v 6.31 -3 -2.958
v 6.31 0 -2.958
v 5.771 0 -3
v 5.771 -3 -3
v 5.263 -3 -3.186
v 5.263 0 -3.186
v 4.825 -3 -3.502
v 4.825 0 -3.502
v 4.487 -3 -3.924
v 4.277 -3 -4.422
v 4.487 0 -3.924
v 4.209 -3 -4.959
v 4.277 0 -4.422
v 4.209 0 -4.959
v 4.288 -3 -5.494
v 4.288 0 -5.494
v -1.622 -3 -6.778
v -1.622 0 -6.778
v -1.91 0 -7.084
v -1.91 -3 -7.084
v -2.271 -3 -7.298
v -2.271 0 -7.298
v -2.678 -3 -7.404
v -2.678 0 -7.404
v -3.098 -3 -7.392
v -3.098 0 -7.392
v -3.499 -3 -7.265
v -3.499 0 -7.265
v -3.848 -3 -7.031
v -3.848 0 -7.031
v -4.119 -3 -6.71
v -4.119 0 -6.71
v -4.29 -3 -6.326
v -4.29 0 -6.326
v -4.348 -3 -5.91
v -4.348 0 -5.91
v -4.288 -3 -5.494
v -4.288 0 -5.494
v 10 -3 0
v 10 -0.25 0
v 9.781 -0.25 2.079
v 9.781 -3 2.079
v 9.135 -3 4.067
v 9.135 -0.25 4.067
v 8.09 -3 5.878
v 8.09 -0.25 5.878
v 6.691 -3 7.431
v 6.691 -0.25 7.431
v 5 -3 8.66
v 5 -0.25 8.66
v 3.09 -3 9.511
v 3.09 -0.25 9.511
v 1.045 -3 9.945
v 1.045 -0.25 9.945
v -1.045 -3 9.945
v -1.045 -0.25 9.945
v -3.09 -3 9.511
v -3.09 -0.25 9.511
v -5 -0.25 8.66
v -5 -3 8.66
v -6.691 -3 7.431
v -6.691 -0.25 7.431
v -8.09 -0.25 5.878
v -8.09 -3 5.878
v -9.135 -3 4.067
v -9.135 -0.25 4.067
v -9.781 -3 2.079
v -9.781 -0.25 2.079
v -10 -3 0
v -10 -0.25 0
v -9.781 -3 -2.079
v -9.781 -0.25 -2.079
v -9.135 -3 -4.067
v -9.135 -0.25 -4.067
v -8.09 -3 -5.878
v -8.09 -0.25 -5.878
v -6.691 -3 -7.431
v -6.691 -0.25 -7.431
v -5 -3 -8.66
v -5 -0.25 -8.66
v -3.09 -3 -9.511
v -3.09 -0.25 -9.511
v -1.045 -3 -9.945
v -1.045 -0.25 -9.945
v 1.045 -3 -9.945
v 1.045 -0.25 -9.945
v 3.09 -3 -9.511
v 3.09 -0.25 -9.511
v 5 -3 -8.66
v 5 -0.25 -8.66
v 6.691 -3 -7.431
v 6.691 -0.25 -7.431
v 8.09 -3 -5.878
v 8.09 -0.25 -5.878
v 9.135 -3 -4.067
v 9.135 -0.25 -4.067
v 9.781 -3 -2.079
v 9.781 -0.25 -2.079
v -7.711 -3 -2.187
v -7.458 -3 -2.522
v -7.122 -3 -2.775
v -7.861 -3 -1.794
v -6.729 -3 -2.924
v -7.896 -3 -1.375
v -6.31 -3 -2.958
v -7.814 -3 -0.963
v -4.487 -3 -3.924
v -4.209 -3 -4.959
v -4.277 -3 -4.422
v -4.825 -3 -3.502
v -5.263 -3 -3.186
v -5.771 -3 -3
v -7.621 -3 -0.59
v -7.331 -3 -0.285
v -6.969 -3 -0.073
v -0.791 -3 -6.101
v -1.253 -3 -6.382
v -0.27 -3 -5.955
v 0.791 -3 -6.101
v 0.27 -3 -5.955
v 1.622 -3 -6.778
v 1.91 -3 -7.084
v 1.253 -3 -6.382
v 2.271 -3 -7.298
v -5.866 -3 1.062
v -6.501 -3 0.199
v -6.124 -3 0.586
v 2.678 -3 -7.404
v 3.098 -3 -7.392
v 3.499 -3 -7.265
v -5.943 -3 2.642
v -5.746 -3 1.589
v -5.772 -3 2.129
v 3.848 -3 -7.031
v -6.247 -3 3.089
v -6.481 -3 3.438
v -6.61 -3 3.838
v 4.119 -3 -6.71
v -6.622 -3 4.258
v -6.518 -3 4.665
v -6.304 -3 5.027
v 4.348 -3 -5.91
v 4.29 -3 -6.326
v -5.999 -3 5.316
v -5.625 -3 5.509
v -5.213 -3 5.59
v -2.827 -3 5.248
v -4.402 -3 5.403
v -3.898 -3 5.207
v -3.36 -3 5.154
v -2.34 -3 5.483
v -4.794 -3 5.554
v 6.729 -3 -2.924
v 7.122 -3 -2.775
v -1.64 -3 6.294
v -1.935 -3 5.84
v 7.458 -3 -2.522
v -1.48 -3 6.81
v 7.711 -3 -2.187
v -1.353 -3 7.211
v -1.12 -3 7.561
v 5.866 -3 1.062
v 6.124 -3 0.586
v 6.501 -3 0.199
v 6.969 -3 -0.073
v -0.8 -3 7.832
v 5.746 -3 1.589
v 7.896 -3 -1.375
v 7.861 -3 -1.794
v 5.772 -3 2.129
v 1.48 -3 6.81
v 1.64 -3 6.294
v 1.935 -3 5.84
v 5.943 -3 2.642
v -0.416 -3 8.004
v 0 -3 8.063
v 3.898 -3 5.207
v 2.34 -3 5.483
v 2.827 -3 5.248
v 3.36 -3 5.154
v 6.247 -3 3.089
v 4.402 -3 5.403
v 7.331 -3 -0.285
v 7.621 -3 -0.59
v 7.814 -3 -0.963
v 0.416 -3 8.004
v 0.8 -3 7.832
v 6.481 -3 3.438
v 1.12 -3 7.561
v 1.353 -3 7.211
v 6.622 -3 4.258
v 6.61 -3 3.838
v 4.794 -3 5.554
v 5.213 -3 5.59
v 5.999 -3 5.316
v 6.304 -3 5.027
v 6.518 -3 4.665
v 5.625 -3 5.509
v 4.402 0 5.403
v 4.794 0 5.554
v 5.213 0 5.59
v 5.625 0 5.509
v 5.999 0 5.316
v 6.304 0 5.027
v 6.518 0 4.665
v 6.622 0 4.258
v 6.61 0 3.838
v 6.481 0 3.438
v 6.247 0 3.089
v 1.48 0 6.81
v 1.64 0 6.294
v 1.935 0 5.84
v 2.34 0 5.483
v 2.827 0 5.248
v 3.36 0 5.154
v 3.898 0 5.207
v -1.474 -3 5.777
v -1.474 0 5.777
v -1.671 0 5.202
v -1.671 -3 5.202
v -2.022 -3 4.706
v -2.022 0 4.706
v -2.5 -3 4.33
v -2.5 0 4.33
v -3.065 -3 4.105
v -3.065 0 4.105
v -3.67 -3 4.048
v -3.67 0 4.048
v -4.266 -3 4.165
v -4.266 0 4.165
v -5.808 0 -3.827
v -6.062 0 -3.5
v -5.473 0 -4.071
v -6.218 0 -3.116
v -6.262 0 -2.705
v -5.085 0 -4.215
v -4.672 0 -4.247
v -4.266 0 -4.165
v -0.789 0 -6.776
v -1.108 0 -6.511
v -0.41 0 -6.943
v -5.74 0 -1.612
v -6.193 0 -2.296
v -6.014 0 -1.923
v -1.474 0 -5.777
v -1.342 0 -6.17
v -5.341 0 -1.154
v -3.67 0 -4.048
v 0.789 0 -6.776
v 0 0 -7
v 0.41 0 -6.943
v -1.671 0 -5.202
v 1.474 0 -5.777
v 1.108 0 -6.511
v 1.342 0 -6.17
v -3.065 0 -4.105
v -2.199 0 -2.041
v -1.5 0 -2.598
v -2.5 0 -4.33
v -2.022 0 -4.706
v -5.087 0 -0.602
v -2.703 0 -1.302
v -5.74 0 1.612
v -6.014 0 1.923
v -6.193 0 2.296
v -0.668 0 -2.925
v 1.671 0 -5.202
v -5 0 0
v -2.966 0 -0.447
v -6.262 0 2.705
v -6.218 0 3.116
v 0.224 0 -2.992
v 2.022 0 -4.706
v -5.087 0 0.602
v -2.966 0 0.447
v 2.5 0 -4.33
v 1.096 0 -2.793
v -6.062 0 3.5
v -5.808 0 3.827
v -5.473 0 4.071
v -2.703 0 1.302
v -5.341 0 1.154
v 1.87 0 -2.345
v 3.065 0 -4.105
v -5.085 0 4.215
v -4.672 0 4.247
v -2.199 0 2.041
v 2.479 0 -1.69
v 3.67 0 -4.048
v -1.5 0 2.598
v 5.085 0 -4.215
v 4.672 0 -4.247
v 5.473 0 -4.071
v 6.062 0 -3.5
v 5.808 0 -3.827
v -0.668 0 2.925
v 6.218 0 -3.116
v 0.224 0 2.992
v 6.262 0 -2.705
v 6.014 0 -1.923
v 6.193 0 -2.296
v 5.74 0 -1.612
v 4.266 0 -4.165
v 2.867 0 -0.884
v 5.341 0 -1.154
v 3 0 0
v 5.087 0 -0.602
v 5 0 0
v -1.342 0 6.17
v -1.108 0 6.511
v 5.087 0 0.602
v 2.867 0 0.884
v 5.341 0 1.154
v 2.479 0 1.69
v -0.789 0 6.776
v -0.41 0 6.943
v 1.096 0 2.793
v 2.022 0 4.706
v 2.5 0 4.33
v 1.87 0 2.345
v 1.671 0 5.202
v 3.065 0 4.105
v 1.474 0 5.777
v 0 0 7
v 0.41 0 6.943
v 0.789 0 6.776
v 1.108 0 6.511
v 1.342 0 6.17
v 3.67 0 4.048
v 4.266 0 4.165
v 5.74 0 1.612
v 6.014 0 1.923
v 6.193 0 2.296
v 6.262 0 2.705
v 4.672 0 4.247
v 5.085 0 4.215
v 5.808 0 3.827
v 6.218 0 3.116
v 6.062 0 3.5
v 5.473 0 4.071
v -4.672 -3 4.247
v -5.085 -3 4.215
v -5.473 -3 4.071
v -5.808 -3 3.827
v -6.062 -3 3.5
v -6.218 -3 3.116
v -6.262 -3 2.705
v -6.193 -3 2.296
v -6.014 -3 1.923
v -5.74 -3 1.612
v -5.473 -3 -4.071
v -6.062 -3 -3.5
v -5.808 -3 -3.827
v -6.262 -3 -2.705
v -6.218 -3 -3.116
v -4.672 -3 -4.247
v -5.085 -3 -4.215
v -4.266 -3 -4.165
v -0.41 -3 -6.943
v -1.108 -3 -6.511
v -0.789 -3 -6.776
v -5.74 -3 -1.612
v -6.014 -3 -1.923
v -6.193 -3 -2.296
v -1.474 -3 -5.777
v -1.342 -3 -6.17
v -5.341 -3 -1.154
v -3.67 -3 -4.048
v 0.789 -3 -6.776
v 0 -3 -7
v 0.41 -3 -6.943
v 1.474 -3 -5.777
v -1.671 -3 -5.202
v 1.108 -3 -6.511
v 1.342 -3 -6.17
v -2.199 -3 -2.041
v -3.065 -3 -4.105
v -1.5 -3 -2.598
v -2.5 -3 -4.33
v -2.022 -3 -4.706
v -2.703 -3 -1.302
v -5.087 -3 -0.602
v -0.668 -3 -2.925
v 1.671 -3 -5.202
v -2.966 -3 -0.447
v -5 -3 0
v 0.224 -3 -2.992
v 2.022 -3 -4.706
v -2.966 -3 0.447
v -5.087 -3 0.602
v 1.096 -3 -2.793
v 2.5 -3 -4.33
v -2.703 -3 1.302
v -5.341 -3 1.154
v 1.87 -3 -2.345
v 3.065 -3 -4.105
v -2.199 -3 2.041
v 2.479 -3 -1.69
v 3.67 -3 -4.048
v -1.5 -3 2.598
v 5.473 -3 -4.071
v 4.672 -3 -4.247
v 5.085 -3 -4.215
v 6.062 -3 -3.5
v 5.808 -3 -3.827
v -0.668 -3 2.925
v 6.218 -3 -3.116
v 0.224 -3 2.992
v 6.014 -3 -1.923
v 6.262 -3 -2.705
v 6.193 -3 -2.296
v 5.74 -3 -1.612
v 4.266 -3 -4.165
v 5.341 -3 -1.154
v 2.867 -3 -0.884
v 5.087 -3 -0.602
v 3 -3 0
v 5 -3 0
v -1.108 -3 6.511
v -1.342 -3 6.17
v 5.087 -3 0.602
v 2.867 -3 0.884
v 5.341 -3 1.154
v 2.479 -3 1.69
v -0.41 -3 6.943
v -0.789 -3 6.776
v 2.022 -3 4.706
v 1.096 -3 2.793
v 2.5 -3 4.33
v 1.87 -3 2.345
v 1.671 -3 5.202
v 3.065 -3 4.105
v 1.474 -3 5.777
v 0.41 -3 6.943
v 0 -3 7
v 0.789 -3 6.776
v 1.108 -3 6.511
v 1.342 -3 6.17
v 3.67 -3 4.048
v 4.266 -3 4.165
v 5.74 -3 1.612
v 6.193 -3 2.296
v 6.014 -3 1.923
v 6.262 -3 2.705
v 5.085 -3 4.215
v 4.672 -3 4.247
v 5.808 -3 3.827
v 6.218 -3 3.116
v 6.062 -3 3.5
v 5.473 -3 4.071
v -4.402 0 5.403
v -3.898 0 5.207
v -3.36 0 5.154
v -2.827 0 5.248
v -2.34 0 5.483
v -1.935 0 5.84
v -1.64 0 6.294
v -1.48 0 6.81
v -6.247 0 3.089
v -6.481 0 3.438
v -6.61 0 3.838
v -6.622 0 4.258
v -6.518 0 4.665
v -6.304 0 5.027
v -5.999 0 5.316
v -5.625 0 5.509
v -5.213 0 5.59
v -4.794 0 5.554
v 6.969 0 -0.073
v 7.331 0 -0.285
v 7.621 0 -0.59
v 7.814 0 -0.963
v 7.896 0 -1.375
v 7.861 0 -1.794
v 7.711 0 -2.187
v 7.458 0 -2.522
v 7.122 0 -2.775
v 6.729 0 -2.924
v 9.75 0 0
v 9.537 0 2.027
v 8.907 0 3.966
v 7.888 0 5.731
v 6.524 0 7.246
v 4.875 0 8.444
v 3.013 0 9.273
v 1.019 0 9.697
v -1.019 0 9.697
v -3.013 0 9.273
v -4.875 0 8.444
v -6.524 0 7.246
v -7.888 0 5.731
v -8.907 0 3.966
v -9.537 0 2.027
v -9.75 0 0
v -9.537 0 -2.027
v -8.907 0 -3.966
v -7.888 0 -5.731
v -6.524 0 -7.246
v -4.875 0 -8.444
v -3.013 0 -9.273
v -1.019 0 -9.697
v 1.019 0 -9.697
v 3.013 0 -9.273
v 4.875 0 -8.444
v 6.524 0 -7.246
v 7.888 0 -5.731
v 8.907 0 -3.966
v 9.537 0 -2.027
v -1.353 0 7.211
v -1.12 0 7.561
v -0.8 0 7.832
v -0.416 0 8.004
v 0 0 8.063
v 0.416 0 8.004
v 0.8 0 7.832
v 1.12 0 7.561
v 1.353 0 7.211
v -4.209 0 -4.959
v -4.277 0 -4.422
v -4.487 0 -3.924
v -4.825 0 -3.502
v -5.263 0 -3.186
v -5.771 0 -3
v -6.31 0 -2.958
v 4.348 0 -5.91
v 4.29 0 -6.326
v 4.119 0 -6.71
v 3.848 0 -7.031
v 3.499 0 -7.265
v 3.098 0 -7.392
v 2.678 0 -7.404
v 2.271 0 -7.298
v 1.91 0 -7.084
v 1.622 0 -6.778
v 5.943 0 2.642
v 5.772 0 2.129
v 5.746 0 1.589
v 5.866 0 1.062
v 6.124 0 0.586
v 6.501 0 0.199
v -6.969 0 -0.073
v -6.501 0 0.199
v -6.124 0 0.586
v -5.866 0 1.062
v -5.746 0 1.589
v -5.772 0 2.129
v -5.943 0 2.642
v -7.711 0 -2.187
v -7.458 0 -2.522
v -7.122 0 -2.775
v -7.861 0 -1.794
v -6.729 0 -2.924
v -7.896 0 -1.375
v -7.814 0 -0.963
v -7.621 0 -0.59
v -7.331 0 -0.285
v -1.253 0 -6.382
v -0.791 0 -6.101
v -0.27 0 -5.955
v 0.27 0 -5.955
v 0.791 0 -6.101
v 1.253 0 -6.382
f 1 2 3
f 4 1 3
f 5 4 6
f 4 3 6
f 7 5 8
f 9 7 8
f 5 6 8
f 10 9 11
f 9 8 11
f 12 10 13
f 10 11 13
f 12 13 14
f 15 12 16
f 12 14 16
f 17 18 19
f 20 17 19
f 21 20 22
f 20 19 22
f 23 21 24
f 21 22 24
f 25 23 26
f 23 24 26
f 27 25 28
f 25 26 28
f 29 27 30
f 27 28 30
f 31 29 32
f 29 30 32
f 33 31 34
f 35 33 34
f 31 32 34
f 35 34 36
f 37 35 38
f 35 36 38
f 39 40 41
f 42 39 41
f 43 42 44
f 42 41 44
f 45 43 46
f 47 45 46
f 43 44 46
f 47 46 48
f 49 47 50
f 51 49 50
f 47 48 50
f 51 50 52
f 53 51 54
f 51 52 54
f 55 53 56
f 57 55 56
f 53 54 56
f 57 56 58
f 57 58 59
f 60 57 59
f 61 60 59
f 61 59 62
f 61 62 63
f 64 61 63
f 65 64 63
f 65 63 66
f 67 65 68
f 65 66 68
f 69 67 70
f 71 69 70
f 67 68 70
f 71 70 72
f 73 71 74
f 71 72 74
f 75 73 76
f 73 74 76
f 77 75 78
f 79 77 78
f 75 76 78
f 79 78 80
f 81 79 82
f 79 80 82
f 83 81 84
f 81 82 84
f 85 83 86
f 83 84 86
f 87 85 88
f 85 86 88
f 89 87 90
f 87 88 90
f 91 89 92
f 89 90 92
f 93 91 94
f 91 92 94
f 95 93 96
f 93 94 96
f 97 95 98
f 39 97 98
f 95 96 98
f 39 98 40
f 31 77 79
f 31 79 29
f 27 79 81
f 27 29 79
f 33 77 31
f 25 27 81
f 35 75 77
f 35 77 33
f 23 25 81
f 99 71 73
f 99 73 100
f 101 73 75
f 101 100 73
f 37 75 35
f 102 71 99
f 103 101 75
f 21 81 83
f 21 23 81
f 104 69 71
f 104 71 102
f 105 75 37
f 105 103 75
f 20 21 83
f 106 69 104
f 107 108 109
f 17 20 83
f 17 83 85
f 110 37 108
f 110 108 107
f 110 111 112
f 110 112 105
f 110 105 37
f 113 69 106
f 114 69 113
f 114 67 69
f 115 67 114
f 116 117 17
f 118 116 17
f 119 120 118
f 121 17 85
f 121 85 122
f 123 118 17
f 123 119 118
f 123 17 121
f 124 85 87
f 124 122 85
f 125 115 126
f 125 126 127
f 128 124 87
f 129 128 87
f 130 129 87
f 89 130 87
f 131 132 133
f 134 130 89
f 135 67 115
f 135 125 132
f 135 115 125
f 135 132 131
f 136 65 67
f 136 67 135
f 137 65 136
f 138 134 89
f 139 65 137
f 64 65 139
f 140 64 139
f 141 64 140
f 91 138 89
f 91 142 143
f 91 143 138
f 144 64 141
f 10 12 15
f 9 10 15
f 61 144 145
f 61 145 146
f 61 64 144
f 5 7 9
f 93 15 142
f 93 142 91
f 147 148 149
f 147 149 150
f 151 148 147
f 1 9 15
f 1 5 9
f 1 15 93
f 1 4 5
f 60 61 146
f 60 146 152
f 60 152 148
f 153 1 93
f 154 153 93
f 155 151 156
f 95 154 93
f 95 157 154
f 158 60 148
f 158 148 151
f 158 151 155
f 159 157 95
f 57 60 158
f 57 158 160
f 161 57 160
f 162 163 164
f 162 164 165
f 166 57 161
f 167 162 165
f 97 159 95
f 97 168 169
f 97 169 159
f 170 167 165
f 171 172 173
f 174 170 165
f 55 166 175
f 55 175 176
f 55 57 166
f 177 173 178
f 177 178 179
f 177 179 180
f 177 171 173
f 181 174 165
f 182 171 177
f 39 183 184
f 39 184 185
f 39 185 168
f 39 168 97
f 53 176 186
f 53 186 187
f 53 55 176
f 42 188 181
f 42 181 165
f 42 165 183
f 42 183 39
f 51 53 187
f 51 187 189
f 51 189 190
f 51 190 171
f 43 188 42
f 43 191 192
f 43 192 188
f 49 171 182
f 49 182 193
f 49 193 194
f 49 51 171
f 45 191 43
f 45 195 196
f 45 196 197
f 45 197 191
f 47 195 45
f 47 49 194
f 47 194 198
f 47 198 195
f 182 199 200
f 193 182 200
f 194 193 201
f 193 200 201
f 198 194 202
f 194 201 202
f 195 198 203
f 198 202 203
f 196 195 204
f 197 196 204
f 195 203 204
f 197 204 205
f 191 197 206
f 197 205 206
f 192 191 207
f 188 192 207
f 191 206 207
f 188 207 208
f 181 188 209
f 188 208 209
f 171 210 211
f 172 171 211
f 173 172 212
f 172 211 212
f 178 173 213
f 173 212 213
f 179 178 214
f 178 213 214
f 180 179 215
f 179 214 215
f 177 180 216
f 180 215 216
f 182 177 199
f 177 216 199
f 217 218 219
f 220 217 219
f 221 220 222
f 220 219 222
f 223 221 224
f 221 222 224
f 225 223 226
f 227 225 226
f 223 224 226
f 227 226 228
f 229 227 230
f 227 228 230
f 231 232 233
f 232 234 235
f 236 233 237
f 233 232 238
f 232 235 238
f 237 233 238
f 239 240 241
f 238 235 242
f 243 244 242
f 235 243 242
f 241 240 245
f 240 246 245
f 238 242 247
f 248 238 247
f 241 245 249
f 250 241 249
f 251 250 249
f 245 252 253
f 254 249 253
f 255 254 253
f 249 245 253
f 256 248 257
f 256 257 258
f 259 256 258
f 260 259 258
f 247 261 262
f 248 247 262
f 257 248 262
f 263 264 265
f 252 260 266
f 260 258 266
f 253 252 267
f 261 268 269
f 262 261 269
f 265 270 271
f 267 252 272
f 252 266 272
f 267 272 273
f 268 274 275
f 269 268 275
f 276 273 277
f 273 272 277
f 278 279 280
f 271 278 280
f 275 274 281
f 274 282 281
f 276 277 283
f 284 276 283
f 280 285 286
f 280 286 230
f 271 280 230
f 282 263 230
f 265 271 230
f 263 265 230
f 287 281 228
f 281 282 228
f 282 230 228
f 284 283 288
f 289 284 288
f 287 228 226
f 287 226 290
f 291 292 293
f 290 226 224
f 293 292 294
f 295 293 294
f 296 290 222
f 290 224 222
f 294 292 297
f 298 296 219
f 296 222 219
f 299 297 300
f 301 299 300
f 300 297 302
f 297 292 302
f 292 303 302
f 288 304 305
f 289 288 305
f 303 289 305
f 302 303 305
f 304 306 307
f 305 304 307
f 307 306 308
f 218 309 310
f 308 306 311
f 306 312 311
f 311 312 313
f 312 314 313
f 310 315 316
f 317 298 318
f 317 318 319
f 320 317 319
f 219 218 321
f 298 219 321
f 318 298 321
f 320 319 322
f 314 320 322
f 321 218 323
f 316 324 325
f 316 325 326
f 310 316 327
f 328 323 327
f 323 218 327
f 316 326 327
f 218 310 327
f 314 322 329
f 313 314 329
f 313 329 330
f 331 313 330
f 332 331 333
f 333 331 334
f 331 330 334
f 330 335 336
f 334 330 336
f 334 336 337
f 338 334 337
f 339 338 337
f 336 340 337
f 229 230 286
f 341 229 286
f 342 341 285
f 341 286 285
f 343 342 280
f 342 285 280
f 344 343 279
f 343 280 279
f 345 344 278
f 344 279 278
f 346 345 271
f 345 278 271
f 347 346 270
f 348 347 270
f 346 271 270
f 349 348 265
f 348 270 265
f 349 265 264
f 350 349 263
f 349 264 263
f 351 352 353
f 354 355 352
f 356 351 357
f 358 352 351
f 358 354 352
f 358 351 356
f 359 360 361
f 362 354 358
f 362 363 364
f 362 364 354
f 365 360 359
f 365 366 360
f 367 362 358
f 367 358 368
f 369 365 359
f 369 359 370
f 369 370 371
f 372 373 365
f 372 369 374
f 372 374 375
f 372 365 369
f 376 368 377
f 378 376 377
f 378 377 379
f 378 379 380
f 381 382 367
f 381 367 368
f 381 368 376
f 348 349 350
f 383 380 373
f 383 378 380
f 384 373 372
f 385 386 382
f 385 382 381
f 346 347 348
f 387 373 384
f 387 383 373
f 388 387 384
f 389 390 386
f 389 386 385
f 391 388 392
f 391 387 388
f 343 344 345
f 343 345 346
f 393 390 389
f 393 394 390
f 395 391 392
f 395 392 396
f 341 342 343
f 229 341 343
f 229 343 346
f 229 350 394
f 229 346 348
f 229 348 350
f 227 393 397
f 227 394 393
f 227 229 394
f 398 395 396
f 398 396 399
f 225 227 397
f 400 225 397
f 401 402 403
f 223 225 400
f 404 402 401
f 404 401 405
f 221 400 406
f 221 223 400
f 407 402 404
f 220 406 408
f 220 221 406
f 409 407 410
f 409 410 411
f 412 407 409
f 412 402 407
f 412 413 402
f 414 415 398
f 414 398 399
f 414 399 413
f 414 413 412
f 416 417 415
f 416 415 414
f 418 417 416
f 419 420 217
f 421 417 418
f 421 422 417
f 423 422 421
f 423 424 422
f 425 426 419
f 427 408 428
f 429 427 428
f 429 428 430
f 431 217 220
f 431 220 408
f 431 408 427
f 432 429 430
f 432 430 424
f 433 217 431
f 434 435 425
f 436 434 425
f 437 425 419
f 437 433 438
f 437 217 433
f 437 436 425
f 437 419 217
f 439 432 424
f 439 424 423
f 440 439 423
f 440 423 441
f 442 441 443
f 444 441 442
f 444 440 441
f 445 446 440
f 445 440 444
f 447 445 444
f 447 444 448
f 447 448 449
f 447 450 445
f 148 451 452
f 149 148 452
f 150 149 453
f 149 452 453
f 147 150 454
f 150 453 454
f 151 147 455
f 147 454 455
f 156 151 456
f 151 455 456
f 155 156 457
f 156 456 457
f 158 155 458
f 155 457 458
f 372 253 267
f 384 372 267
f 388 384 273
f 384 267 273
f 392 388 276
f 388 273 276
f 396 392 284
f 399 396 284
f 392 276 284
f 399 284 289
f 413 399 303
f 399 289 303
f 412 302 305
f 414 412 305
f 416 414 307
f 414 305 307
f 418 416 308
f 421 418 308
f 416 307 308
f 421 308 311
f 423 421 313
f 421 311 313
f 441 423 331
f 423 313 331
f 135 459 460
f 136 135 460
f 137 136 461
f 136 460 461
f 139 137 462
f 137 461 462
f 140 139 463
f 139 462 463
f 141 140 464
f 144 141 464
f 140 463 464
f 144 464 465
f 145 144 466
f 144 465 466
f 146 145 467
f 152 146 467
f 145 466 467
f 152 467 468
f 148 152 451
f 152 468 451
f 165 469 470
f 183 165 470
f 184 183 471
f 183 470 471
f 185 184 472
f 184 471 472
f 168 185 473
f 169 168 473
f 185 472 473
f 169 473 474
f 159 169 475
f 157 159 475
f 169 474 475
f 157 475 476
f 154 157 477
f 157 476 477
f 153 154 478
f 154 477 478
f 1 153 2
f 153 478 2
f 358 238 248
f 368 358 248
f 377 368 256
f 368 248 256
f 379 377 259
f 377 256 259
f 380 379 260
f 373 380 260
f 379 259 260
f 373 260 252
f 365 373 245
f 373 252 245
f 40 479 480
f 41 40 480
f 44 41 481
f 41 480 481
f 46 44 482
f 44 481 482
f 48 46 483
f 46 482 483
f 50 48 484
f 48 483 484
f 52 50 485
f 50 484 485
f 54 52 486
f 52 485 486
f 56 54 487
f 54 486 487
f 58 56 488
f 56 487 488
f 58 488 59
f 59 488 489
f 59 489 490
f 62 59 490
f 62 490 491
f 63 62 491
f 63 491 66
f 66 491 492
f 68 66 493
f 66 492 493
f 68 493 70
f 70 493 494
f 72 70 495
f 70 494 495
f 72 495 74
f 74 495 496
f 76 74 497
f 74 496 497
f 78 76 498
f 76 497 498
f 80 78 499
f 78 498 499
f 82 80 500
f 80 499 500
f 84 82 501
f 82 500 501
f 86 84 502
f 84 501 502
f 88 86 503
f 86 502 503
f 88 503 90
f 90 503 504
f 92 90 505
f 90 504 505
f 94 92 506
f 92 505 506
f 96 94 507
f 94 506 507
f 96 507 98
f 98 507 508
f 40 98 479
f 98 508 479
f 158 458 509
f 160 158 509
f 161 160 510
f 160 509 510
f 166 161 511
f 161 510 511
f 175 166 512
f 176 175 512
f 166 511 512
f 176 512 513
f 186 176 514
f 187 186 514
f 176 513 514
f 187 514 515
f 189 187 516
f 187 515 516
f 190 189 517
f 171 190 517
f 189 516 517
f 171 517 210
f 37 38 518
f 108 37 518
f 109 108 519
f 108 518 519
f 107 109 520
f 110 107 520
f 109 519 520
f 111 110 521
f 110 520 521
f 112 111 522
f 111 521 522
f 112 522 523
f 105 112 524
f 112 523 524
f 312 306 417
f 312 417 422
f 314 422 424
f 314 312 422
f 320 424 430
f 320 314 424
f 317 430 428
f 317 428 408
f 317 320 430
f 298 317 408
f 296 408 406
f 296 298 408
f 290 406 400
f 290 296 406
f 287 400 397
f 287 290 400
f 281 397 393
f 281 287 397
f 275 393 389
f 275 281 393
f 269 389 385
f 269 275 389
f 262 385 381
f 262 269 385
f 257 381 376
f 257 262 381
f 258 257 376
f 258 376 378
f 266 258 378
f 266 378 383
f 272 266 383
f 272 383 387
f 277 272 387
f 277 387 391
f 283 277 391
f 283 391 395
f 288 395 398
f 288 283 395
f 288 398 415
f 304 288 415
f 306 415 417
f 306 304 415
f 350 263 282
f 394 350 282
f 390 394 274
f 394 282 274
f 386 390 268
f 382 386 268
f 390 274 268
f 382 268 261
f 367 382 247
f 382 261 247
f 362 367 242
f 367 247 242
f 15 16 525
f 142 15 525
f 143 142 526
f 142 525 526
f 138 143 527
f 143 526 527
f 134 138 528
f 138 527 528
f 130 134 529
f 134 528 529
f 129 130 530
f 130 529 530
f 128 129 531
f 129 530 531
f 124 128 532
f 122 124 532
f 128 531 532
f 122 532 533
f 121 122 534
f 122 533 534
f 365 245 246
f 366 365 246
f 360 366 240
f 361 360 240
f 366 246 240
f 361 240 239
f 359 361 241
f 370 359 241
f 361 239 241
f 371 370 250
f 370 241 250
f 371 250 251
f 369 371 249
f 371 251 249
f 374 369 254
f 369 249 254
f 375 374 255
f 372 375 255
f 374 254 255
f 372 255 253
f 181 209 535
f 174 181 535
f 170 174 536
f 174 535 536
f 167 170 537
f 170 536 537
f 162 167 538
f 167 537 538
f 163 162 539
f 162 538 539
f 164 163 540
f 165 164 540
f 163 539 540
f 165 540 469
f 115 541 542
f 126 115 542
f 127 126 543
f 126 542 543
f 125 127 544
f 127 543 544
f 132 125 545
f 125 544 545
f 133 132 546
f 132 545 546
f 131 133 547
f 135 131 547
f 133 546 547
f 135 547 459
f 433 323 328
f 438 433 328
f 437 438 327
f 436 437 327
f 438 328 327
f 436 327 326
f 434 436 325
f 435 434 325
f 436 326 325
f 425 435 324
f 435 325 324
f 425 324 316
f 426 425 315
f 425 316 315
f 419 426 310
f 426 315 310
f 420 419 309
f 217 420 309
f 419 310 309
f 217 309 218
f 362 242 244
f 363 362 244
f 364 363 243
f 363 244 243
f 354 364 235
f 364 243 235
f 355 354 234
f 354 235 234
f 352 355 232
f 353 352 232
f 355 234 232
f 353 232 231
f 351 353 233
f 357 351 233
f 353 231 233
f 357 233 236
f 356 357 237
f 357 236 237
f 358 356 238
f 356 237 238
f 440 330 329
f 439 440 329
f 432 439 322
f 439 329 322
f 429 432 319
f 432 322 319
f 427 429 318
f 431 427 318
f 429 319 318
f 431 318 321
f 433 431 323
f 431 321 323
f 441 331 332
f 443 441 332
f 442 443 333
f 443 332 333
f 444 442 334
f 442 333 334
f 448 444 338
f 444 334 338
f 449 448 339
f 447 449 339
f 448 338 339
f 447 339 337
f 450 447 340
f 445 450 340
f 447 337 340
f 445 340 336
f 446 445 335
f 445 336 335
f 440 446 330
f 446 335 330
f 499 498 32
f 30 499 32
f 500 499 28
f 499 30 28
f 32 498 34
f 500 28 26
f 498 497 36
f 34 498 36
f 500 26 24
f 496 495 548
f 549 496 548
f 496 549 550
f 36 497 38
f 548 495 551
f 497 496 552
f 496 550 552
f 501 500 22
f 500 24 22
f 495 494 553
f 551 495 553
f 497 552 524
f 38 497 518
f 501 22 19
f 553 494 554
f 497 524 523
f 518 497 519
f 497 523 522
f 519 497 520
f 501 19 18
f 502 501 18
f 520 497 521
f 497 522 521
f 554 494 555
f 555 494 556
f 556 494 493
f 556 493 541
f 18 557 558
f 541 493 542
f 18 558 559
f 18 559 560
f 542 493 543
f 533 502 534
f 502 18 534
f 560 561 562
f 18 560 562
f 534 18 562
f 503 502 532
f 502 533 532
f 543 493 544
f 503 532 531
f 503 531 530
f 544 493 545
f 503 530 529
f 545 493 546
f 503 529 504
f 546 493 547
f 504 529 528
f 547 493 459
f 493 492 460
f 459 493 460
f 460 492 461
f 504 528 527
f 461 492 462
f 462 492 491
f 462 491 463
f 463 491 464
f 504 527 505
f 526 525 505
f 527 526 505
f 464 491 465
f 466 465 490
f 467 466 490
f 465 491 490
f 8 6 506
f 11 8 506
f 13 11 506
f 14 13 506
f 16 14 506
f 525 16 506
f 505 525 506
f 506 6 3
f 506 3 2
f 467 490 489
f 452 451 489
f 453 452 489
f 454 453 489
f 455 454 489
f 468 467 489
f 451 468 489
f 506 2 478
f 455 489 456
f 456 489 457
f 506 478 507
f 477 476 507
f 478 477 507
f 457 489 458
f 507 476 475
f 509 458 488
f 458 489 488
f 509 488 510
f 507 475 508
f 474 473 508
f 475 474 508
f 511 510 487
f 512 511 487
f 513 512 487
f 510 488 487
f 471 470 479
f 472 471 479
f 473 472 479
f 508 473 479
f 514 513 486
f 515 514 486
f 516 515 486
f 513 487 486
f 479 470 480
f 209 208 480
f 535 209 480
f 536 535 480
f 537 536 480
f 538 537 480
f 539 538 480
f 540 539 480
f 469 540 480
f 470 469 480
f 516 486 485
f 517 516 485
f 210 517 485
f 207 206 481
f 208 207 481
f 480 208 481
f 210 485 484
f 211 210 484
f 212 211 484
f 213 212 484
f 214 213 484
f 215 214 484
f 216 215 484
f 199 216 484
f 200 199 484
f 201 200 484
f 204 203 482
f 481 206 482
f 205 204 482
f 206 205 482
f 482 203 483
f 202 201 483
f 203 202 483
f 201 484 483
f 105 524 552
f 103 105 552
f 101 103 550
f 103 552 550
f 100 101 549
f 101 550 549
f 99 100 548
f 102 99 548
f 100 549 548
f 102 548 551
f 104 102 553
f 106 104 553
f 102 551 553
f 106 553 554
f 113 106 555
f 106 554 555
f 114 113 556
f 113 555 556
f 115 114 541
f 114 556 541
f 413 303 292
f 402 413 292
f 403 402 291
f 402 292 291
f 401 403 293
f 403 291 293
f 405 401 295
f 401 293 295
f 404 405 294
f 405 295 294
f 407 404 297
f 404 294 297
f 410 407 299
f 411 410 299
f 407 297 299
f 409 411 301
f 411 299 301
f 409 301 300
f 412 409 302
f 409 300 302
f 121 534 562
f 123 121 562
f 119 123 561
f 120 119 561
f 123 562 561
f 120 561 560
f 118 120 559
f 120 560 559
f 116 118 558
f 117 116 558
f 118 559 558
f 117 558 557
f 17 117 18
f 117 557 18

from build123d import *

# Parameters (mm, degrees)
F0_R     = 3
F1_DEPTH = 3
F2_R     = 10
F3_DEPTH = 3
F4_SIZE  = 0.25


with BuildPart() as f1:
    # F0 (on Front) → F1 (new body)
    with BuildSketch(Plane.XZ):
        with BuildLine():
            ThreePointArc((4.266359, 4.165347), (2.5, 4.330127), (1.474117, 5.777449))
            ThreePointArc((1.474117, 5.777449), (0, 7), (-1.474117, 5.777449))
            ThreePointArc((-1.474117, 5.777449), (-2.5, 4.330127), (-4.266359, 4.165347))
            ThreePointArc((-4.266359, 4.165347), (-6.062178, 3.5), (-5.740476, 1.612101))
            ThreePointArc((-5.740476, 1.612101), (-5, 0), (-5.740476, -1.612101))
            ThreePointArc((-5.740476, -1.612101), (-6.062178, -3.5), (-4.266359, -4.165347))
            ThreePointArc((-4.266359, -4.165347), (-2.5, -4.330127), (-1.474117, -5.777449))
            ThreePointArc((-1.474117, -5.777449), (0, -7), (1.474117, -5.777449))
            ThreePointArc((1.474117, -5.777449), (2.5, -4.330127), (4.266359, -4.165347))
            ThreePointArc((4.266359, -4.165347), (6.062178, -3.5), (5.740476, -1.612101))
            ThreePointArc((5.740476, -1.612101), (5, 0), (5.740476, 1.612101))
            ThreePointArc((5.740476, 1.612101), (6.062178, 3.5), (4.266359, 4.165347))
        make_face()
        Circle(F0_R, mode=Mode.SUBTRACT)
    extrude(amount=F1_DEPTH)


with BuildPart() as f3:
    # F2 (on Front) → F3 (new body)
    with BuildSketch(Plane.XZ):
        Circle(F2_R)
        with BuildLine():
            ThreePointArc((-1.479564, 6.810073), (0, 8.063316), (1.479564, 6.810073))
            ThreePointArc((1.479564, 6.810073), (2.575831, 5.348768), (4.401836, 5.402781))
            ThreePointArc((4.401836, 5.402781), (6.304154, 5.027395), (6.246823, 3.089241))
            ThreePointArc((6.246823, 3.089241), (5.787839, 1.321036), (6.968565, -0.072915))
            ThreePointArc((6.968565, -0.072915), (7.861152, -1.794257), (6.310097, -2.957852))
            ThreePointArc((6.310097, -2.957852), (4.641487, -3.701462), (4.287822, -5.493705))
            ThreePointArc((4.287822, -5.493705), (3.498542, -7.264797), (1.621739, -6.777623))
            ThreePointArc((1.621739, -6.777623), (0, -5.936684), (-1.621739, -6.777623))
            ThreePointArc((-1.621739, -6.777623), (-3.498542, -7.264797), (-4.287822, -5.493705))
            ThreePointArc((-4.287822, -5.493705), (-4.641487, -3.701462), (-6.310097, -2.957852))
            ThreePointArc((-6.310097, -2.957852), (-7.861152, -1.794257), (-6.968565, -0.072915))
            ThreePointArc((-6.968565, -0.072915), (-5.787839, 1.321036), (-6.246823, 3.089241))
            ThreePointArc((-6.246823, 3.089241), (-6.304154, 5.027395), (-4.401836, 5.402781))
            ThreePointArc((-4.401836, 5.402781), (-2.575831, 5.348768), (-1.479564, 6.810073))
        make_face(mode=Mode.SUBTRACT)
    extrude(amount=F3_DEPTH)

    # F4
    f4_edges = [f3.edges().sort_by_distance(p)[0] for p in [
        (-10, 0, 0),
    ]]
    chamfer(f4_edges, length=F4_SIZE)


solid = Compound([f1.part, f3.part])
